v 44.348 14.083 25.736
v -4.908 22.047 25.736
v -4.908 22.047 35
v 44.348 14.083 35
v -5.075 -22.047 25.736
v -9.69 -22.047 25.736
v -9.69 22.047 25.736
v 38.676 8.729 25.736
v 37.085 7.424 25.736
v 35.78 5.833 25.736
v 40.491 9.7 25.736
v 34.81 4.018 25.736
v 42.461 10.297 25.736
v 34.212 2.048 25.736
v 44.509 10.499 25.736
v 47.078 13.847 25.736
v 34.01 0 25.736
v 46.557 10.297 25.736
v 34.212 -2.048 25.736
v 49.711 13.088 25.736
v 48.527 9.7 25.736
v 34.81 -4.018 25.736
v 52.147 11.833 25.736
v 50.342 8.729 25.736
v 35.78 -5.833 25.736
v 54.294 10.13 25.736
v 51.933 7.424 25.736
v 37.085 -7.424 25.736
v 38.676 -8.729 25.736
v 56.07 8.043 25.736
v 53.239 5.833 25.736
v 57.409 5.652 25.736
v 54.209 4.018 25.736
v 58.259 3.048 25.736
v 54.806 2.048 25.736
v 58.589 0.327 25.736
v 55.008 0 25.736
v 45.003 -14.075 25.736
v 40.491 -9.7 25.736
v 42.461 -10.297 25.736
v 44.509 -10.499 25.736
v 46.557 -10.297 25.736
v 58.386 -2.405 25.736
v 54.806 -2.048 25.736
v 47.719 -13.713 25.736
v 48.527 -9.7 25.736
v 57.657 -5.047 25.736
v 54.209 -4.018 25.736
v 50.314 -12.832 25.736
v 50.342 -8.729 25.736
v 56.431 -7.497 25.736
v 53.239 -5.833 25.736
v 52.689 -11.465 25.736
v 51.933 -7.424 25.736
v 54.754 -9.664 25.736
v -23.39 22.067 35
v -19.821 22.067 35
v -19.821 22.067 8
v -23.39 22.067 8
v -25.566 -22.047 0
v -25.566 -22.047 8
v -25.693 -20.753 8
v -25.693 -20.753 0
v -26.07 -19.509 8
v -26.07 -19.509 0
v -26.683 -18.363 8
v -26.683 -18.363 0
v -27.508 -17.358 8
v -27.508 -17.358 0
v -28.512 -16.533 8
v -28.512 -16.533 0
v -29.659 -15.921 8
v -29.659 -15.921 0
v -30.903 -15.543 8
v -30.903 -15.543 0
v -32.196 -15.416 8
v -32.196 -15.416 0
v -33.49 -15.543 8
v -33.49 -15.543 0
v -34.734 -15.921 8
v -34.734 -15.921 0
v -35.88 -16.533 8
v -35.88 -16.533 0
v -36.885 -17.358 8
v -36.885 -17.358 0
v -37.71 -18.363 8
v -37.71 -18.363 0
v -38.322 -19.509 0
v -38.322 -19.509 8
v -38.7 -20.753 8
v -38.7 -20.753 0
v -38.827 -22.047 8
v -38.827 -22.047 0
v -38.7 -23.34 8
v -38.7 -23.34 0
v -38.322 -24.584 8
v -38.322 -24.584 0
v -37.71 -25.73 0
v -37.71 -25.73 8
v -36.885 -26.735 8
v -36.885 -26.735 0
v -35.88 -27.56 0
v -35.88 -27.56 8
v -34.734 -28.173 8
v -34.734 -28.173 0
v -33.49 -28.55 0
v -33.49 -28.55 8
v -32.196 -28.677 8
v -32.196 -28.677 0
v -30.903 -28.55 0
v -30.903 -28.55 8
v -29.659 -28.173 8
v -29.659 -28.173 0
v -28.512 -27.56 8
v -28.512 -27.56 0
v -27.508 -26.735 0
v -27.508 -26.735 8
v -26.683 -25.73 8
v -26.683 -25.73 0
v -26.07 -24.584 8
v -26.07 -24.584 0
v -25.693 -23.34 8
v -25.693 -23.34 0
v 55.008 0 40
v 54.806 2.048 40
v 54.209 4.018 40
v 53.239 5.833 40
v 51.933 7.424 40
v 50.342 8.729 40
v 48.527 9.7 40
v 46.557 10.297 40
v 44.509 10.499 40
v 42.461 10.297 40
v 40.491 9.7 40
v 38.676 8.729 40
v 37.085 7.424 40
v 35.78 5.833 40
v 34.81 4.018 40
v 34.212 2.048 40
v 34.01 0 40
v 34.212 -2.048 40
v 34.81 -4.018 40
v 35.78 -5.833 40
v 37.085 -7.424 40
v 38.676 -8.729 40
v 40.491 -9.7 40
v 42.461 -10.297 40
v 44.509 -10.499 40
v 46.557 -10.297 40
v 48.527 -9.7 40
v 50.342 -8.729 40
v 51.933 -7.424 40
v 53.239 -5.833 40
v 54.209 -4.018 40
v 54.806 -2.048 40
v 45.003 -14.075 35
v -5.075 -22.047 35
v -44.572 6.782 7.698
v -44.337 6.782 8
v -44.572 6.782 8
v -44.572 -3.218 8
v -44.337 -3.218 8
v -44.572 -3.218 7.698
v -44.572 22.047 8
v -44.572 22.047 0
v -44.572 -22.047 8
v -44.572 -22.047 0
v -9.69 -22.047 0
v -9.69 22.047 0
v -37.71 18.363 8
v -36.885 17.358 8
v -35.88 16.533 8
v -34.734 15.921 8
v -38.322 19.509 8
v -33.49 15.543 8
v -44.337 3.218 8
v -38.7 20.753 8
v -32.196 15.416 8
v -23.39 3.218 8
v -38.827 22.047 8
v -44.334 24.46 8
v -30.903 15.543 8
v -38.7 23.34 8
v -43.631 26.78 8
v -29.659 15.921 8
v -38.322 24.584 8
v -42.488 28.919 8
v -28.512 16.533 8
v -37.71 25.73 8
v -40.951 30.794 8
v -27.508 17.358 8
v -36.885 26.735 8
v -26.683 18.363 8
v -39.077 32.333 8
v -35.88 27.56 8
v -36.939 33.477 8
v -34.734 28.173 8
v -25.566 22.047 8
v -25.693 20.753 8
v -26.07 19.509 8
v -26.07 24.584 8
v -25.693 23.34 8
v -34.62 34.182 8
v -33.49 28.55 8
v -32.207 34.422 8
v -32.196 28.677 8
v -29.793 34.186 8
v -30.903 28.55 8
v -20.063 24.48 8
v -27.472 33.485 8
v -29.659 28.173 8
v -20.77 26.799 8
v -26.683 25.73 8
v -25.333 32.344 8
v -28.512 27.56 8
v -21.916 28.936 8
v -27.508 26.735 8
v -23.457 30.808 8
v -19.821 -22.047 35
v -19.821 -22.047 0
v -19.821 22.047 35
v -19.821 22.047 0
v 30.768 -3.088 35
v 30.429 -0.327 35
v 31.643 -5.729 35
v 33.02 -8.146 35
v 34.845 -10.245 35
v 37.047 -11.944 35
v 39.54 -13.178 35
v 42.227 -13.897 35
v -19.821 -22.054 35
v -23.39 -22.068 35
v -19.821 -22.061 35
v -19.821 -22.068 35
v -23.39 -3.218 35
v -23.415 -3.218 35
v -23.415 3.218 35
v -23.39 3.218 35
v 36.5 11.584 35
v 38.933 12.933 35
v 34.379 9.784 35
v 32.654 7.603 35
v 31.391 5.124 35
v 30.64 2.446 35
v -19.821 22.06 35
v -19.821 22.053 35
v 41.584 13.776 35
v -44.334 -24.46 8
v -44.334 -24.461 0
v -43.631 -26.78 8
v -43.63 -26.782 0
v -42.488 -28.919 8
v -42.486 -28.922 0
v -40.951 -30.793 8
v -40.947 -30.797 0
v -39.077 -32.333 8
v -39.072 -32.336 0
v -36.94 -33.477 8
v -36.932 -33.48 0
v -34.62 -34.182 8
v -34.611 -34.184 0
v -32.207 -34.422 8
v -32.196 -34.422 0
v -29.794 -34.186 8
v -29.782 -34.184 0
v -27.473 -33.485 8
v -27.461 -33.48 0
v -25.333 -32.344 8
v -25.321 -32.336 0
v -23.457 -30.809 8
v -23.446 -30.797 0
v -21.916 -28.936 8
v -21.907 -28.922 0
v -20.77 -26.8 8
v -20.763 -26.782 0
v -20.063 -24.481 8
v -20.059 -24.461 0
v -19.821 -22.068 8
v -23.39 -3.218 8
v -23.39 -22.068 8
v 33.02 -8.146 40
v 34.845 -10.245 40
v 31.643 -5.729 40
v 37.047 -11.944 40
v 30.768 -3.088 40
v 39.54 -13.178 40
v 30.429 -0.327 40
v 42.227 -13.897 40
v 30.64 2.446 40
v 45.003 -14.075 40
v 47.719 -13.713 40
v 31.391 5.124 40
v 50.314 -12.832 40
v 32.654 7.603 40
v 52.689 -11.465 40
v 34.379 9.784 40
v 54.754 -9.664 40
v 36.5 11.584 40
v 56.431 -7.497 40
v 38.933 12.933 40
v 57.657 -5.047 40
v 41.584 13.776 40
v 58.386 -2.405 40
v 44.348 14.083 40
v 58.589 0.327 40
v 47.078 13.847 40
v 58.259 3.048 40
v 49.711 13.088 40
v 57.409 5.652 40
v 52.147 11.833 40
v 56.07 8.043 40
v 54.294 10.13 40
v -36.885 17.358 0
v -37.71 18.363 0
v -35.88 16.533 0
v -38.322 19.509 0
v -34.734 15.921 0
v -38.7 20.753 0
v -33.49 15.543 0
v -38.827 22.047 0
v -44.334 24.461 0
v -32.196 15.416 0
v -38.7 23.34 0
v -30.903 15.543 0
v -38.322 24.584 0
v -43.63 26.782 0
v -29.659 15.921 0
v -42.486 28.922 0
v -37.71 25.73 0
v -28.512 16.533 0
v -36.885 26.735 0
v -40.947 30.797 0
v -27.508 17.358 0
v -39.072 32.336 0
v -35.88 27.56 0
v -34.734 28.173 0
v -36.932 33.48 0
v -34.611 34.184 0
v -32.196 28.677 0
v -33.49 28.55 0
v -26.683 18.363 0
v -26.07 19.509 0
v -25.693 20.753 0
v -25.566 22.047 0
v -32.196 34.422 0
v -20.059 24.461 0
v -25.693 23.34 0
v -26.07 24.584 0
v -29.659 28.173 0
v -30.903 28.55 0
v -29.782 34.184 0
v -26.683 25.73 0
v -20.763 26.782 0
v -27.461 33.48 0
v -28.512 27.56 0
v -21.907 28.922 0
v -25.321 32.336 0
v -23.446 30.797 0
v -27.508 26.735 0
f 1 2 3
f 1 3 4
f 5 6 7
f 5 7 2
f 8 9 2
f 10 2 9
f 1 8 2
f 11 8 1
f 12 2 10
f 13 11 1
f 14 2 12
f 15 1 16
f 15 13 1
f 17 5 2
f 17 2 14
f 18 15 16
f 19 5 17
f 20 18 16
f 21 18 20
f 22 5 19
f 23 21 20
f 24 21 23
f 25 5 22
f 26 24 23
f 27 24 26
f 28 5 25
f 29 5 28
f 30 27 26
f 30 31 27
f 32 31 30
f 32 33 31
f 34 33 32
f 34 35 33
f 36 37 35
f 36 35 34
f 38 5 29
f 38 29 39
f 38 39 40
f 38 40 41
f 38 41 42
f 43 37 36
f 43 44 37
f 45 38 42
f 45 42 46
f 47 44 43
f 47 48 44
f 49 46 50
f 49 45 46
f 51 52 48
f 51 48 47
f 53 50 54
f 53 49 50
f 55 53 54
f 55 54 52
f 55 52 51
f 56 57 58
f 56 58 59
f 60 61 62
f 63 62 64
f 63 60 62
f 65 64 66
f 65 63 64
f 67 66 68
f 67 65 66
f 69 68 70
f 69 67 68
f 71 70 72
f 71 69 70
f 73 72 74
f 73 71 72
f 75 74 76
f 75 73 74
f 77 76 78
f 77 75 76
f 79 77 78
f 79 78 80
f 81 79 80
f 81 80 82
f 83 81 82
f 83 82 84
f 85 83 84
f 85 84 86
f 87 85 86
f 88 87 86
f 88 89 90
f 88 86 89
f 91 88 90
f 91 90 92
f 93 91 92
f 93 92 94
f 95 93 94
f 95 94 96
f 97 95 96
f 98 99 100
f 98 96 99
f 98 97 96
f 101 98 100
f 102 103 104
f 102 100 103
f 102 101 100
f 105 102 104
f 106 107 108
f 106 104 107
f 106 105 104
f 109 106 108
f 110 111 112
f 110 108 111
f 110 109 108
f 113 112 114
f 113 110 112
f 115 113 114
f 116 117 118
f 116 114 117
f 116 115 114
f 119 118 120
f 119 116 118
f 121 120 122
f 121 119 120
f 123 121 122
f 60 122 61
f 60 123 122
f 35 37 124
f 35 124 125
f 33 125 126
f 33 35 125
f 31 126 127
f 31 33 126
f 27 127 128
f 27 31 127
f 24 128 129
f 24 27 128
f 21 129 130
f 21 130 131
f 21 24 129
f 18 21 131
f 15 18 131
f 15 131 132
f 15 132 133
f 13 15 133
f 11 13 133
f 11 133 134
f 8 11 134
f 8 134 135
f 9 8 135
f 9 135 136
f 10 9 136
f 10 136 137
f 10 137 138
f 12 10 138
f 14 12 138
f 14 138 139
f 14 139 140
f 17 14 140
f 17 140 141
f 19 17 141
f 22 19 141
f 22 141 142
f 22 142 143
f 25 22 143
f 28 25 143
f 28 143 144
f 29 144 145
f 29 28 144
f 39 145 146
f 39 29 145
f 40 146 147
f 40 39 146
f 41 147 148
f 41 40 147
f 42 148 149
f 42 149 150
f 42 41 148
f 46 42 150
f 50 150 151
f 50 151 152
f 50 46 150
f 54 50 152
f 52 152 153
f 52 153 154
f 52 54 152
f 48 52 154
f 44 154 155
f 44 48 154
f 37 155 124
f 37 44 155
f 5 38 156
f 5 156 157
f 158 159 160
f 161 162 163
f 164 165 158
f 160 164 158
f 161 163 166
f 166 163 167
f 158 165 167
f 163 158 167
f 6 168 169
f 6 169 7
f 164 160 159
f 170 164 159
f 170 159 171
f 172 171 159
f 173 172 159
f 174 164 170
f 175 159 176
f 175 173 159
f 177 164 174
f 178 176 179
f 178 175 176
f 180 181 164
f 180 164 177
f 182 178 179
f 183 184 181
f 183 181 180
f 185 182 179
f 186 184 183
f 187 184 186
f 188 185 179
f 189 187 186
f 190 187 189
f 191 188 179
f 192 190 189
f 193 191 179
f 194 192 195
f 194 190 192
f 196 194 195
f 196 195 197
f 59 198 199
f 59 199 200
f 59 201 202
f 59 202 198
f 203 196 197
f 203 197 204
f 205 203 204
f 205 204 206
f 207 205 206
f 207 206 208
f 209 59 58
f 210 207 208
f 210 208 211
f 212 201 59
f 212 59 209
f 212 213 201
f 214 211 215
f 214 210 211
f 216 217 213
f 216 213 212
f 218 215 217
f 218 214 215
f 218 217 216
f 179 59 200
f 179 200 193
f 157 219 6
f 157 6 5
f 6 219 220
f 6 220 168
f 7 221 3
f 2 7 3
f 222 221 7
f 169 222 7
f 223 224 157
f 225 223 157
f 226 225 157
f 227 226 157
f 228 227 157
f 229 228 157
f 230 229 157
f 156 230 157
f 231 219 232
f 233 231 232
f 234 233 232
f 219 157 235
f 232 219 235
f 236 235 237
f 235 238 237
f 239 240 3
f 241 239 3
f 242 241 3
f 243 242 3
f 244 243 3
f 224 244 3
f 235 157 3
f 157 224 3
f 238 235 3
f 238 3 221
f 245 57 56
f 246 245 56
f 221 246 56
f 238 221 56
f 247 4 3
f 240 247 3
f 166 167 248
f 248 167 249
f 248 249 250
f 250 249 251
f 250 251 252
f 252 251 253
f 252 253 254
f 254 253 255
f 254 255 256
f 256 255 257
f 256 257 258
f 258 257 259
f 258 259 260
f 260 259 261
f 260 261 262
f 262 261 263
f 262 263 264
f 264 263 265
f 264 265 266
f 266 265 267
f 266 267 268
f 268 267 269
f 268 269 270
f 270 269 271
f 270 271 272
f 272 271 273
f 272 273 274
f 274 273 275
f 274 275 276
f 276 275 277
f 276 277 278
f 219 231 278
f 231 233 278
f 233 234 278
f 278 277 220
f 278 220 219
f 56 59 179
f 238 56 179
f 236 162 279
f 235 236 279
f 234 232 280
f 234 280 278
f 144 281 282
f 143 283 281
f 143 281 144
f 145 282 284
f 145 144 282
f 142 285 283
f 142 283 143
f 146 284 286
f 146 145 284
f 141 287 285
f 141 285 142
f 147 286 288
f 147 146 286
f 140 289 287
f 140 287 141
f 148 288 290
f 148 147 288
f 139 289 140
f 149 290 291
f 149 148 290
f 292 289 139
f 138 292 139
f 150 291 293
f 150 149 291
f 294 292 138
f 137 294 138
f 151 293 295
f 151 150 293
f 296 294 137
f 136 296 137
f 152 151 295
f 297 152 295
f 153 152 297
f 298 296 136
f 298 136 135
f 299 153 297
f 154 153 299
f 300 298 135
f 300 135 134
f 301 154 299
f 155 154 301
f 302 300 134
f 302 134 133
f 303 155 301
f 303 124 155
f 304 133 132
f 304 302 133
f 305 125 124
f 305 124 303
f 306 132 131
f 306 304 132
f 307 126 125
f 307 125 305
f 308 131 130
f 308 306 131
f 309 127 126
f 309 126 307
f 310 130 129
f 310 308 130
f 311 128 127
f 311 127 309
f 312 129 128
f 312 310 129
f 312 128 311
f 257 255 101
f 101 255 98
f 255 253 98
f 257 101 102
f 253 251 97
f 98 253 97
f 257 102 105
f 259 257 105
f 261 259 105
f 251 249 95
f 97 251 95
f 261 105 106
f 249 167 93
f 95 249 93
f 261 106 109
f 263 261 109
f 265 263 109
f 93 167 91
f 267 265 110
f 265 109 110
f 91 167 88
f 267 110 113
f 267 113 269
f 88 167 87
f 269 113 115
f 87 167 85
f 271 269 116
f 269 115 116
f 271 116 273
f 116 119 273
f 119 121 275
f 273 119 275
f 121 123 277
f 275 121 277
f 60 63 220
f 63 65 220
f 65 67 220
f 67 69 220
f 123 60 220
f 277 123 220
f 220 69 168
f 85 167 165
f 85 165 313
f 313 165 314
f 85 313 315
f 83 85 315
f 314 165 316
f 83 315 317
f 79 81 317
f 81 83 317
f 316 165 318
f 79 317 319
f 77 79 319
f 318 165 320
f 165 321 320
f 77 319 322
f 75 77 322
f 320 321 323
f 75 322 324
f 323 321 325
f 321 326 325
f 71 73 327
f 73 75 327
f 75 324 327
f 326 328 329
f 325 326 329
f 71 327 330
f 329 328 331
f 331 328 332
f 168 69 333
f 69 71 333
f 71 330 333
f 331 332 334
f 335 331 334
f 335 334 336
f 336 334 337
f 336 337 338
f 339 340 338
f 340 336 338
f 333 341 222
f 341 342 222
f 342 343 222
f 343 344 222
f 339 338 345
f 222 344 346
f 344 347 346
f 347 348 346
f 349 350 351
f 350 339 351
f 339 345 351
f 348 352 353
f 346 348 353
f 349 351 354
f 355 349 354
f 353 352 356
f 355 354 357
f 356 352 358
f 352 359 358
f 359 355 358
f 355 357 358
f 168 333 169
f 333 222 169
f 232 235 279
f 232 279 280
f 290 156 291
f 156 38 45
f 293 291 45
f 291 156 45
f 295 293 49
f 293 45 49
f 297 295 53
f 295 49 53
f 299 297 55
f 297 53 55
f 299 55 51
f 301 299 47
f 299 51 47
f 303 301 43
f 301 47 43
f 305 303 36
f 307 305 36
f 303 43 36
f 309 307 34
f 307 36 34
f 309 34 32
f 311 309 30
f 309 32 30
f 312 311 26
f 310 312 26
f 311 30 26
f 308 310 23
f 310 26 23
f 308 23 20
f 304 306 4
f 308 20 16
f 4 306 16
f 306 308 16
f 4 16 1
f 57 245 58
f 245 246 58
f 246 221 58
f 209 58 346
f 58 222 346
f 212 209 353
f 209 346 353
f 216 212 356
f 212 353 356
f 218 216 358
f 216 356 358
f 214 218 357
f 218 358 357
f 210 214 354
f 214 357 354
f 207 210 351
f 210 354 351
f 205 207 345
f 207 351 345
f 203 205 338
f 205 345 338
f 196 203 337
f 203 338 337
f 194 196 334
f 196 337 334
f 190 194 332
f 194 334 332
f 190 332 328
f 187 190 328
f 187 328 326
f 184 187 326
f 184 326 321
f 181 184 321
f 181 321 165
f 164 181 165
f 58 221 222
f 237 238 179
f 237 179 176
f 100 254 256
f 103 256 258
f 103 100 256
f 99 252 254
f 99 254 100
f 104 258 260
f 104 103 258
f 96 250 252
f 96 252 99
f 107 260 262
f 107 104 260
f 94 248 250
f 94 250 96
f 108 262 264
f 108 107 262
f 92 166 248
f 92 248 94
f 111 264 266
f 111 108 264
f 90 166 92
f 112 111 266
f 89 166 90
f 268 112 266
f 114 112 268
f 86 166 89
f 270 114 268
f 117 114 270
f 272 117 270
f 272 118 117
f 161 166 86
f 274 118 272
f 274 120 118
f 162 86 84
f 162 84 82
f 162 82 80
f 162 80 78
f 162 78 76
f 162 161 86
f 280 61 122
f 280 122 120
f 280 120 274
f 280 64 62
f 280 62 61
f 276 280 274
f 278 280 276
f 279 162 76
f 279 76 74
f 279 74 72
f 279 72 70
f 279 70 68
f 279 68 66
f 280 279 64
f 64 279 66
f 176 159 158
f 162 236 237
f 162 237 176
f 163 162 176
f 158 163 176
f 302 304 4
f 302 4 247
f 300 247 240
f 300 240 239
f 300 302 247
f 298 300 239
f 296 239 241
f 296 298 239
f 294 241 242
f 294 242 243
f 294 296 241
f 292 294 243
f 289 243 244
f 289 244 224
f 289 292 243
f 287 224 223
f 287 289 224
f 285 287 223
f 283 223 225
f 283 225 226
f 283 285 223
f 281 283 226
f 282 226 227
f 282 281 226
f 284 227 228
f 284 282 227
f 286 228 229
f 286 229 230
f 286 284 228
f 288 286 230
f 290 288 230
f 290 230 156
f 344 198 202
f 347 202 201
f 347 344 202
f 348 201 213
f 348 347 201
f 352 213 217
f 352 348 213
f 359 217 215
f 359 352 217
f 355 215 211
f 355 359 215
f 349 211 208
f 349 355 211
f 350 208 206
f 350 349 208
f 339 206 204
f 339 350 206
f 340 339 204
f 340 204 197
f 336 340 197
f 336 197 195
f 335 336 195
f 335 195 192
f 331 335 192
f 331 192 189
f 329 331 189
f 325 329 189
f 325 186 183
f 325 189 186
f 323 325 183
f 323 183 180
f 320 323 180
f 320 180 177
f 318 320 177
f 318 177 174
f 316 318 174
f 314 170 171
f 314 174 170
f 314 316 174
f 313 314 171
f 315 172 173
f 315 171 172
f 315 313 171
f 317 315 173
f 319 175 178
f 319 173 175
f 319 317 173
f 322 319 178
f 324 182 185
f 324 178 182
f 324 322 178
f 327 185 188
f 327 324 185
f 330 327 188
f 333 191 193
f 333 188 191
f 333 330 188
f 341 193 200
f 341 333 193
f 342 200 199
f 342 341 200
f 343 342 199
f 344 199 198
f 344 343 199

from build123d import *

# Parameters (mm, degrees)
SKETCH001_R          = 6.630792
SKETCH001_R_2        = 10.498697
PAD_DEPTH            = 40
POCKET_DEPTH         = 32
POCKET001_DEPTH      = 9
POCKET002_DEPTH      = 5
POCKET003_DEPTH      = 10
SKETCH005_W          = 94.298041
SKETCH005_H          = 32.366995
POCKET004_DEPTH      = 34.422931
POCKET004_DEPTH_BACK = -34.422931


with BuildPart() as part:
    # Sketch001 → Pad (new body)
    with BuildSketch(Plane.XY):
        with BuildLine():
            ThreePointArc((-19.821, 22.046589), (-32.196342, 34.421931), (-44.571684, 22.046589))
            Line((-44.571684, 22.046589), (-44.571684, -22.046589))
            ThreePointArc((-44.571684, -22.046589), (-32.196342, -34.421931), (-19.821, -22.046589))
            Line((-19.821, -22.046589), (-5.074877, -22.046589))
            Line((45.00301, -14.074842), (-5.074877, -22.046589))
            ThreePointArc((45.00301, -14.074842), (58.588852, 0.32742), (44.348215, 14.082584))
            Line((-4.908487, 22.046589), (44.348215, 14.082584))
            Line((-19.821, 22.046589), (-4.908487, 22.046589))
        make_face()
        with Locations((-32.196342, 22.046589)):
            Circle(SKETCH001_R, mode=Mode.SUBTRACT)
        with Locations((-32.196342, -22.046589)):
            Circle(SKETCH001_R, mode=Mode.SUBTRACT)
        with Locations((44.509155, 0)):
            Circle(SKETCH001_R_2, mode=Mode.SUBTRACT)
    extrude(amount=PAD_DEPTH)

    # Sketch002 → Pocket (cut)
    with BuildSketch(Plane.XY.offset(40)):
        with BuildLine():
            ThreePointArc((-19.354646, 22.067252), (-32.292828, 34.810367), (-45.101294, 21.936878))
            Line((-45.101294, 21.936878), (-45.101294, -21.936878))
            ThreePointArc((-45.101294, -21.936878), (-32.29321, -34.810365), (-19.354654, -22.068018))
            Line((-23.390144, -22.068018), (-19.354654, -22.068018))
            Line((-23.390144, -3.218184), (-23.390144, -22.068018))
            Line((-44.728828, -3.218184), (-23.390144, -3.218184))
            Line((-44.728828, 3.218184), (-44.728828, -3.218184))
            Line((-23.390144, 3.218184), (-44.728828, 3.218184))
            Line((-23.390144, 22.067252), (-23.390144, 3.218184))
            Line((-19.354646, 22.067252), (-23.390144, 22.067252))
        make_face()
    extrude(amount=-POCKET_DEPTH, mode=Mode.SUBTRACT)

    # Sketch003 (on Face17 of Pocket) → Pocket001 (cut)
    with BuildSketch(Plane.XZ.offset(3.218184)):
        Polygon((-22.446281, 41.467144), (-45.756935, 6.110793), (-48.87989, 41.467144), align=None)
    extrude(amount=-POCKET001_DEPTH, mode=Mode.SUBTRACT)

    # Sketch → Pocket002 (cut)
    with BuildSketch(Plane.XY.offset(40)):
        with BuildLine():
            Line((-51.758927, -23.019849), (-51.572633, 22.533843))
            Line((-51.572633, 22.533843), (-4.833725, 22.533843))
            Line((-4.833725, 22.533843), (44.348215, 14.082584))
            ThreePointArc((44.348215, 14.082584), (30.429458, -0.32742), (45.00301, -14.074842))
            Line((45.00301, -14.074842), (-5.186409, -23.019849))
            Line((-51.758927, -23.019849), (-5.186409, -23.019849))
        make_face()
    extrude(amount=-POCKET002_DEPTH, mode=Mode.SUBTRACT)

    # Sketch004 (on Face23 of Pocket002) → Pocket003 (cut)
    with BuildSketch(Plane.XZ.offset(3.218184)):
        Polygon((-20.760923, 38.424774), (-49.368839, 1.506935), (-41.058918, 38.424774), align=None)
    extrude(amount=-POCKET003_DEPTH, mode=Mode.SUBTRACT)

    # Sketch005 → Pocket004 (cut, two sides)
    with BuildSketch(Plane.XZ) as pocket004_sk:
        with Locations((37.4594, 9.552193)):
            Rectangle(SKETCH005_W, SKETCH005_H)
    extrude(amount=-POCKET004_DEPTH, mode=Mode.SUBTRACT)
    extrude(pocket004_sk.sketch, amount=-POCKET004_DEPTH_BACK, mode=Mode.SUBTRACT)


solid = part.part
